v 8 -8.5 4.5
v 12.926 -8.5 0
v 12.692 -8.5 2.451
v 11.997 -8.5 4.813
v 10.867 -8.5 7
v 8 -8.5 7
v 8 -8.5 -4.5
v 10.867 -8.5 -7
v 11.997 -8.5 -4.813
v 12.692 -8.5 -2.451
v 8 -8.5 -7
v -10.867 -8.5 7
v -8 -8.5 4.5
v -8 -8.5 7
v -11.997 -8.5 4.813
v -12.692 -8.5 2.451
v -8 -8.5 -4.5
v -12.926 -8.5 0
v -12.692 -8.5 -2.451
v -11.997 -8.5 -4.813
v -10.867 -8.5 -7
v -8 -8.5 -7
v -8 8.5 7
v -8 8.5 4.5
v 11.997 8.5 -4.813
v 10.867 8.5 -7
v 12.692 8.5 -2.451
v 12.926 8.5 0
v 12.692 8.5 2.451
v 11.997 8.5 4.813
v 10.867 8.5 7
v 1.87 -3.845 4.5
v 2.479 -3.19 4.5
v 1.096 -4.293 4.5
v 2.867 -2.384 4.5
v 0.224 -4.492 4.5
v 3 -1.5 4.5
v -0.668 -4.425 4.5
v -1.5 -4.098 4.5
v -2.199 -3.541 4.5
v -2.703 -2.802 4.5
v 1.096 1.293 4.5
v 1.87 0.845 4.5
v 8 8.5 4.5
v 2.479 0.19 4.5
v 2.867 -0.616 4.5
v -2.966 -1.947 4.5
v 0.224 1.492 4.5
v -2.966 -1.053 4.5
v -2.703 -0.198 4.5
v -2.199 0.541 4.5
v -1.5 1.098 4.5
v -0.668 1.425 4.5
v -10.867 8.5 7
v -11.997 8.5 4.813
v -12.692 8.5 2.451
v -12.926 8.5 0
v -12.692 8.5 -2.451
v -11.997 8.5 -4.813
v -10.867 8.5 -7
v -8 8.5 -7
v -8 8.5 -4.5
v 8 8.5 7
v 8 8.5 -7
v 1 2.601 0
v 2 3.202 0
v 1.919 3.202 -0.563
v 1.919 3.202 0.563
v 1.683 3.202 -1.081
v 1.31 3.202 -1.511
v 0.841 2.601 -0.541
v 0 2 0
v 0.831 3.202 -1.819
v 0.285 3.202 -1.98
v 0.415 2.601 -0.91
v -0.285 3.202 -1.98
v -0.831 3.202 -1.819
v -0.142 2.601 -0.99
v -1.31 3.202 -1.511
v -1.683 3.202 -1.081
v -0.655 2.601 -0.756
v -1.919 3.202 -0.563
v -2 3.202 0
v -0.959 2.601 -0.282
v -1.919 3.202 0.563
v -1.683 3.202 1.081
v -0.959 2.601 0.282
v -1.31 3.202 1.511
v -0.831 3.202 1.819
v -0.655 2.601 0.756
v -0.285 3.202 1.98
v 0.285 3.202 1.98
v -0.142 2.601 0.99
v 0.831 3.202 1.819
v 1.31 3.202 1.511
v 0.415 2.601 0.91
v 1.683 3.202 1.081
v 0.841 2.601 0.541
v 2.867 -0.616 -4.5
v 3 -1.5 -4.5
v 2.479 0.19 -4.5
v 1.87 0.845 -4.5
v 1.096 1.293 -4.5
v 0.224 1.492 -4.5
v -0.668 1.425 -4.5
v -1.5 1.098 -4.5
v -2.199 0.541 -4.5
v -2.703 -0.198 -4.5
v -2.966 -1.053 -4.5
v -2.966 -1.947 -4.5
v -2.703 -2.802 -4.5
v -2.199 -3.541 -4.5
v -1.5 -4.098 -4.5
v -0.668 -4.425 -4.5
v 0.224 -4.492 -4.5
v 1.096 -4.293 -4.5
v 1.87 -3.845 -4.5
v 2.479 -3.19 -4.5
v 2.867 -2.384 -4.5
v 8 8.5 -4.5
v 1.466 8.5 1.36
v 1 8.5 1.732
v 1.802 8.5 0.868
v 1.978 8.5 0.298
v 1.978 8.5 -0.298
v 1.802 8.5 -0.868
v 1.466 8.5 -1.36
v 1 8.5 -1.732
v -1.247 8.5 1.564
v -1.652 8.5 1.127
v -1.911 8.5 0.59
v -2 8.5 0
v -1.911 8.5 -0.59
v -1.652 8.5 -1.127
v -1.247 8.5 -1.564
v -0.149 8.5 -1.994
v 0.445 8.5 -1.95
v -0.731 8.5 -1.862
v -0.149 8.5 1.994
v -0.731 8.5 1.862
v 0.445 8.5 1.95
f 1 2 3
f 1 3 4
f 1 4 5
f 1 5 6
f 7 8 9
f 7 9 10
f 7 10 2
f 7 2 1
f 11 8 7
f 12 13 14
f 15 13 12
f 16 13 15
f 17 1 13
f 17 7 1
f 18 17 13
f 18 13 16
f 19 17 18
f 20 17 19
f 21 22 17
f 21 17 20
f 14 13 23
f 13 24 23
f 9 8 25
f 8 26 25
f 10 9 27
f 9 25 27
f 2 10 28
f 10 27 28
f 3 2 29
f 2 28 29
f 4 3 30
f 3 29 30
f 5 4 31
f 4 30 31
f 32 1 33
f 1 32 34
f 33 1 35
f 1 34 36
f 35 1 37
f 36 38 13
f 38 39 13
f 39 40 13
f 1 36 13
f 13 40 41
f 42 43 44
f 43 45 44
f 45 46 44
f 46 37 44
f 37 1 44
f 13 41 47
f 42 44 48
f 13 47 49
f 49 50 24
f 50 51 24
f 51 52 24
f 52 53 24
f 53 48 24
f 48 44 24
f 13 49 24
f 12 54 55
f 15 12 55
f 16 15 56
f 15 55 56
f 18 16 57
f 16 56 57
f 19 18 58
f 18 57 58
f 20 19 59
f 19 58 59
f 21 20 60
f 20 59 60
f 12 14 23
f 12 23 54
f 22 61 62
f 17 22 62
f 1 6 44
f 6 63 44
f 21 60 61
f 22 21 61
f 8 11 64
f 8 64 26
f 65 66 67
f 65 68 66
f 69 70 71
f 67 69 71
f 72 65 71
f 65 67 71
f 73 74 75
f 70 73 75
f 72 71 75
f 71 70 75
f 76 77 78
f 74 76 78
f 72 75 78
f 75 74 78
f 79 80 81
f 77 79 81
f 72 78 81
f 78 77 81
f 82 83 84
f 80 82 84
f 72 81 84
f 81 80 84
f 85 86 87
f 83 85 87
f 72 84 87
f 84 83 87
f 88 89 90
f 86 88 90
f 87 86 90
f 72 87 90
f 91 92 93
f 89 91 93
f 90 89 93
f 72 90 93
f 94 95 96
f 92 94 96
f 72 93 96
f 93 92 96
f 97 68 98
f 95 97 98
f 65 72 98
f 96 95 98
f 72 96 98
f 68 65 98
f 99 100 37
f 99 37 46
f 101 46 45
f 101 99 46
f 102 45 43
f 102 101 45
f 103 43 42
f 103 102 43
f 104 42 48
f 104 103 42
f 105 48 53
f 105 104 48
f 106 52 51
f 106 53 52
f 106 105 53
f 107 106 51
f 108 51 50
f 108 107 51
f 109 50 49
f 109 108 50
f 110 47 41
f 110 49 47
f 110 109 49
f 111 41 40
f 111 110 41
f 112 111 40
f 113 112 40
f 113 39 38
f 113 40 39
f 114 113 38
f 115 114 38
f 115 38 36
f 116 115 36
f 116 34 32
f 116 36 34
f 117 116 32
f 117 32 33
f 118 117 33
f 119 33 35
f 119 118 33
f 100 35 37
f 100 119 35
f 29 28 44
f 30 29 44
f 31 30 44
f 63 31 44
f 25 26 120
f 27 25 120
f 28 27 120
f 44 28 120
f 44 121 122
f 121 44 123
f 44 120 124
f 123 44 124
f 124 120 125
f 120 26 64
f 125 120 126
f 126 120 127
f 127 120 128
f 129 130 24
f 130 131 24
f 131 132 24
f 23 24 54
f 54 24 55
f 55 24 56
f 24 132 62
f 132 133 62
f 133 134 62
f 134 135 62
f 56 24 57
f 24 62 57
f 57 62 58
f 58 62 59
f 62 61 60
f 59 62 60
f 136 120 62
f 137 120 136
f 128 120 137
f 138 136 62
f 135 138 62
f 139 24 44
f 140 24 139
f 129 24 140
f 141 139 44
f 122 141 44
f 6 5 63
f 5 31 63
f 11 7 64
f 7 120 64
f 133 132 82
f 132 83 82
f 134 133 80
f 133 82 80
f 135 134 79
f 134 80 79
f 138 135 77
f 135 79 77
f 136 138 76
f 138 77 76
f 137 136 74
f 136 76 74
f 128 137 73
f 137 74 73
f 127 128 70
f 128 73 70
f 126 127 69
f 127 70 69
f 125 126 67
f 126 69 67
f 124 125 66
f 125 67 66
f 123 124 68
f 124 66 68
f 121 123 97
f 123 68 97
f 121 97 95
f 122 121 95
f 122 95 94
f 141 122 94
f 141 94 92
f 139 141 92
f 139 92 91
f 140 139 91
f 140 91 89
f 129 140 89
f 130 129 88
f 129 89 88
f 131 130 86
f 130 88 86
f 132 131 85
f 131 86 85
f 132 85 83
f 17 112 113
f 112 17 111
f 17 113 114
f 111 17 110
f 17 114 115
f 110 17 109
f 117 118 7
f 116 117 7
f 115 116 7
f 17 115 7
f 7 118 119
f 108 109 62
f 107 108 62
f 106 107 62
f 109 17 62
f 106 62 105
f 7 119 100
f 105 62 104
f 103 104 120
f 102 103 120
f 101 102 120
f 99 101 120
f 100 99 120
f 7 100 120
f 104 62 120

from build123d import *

# Parameters (mm, degrees)
BOSS_EXTRUDE1_DEPTH             = 8.5
TAP_DRILL_FOR_M4X0_7_TAP1_D     = 4
TAP_DRILL_FOR_M4X0_7_TAP1_DEPTH = 5.298278762
TAP_DRILL_FOR_M4X0_7_TAP1_TIP   = 1.201721238
CUT_EXTRUDE1_DEPTH              = 17.980360556
CUT_EXTRUDE1_DEPTH_BACK         = 17.980360556
SKETCH5_R                       = 3


with BuildPart() as part:
    # Sketch1 → Boss-Extrude1 (new, symmetric)
    with BuildSketch(Plane(origin=(0, 0, 0), x_dir=(1, 0, 0), z_dir=(0, 1, 0))):
        with BuildLine():
            Line((-8, 7), (-8, 4.5))
            Line((-8, 4.5), (8, 4.5))
            Line((8, 4.5), (8, 7))
            Line((8, 7), (10.866583853, 7))
            ThreePointArc((10.866583853, 7), (12.926045204, 0), (10.866583853, -7))
            Line((10.866583853, -7), (8, -7))
            Line((8, -7), (8, -4.5))
            Line((8, -4.5), (-8, -4.5))
            Line((-8, -4.5), (-8, -7))
            Line((-8, -7), (-10.866583853, -7))
            ThreePointArc((-10.866583853, -7), (-12.926045204, 0), (-10.866583853, 7))
            Line((-10.866583853, 7), (-8, 7))
        make_face()
    extrude(amount=BOSS_EXTRUDE1_DEPTH, both=True)

    # Tap Drill for M4x0.7 Tap1
    with Locations(Plane(origin=(0, 8.5, 0), x_dir=(1, 0, 0), z_dir=(0, 1, 0))):
        with Locations((0, 0)):
            Hole(TAP_DRILL_FOR_M4X0_7_TAP1_D / 2, depth=TAP_DRILL_FOR_M4X0_7_TAP1_DEPTH)
            with Locations((0, 0, -(TAP_DRILL_FOR_M4X0_7_TAP1_DEPTH + TAP_DRILL_FOR_M4X0_7_TAP1_TIP / 2))):  # 118° drill point
                Cone(0, TAP_DRILL_FOR_M4X0_7_TAP1_D / 2, TAP_DRILL_FOR_M4X0_7_TAP1_TIP, mode=Mode.SUBTRACT)

    # Sketch5 → Cut-Extrude1 (cut, two sides: drawn at the far end of the back side and taken through both)
    with BuildSketch(Plane.XY.offset(-CUT_EXTRUDE1_DEPTH_BACK)):
        with Locations((0, -1.5)):
            Circle(SKETCH5_R)
    extrude(amount=CUT_EXTRUDE1_DEPTH + CUT_EXTRUDE1_DEPTH_BACK, mode=Mode.SUBTRACT)


solid = part.part
